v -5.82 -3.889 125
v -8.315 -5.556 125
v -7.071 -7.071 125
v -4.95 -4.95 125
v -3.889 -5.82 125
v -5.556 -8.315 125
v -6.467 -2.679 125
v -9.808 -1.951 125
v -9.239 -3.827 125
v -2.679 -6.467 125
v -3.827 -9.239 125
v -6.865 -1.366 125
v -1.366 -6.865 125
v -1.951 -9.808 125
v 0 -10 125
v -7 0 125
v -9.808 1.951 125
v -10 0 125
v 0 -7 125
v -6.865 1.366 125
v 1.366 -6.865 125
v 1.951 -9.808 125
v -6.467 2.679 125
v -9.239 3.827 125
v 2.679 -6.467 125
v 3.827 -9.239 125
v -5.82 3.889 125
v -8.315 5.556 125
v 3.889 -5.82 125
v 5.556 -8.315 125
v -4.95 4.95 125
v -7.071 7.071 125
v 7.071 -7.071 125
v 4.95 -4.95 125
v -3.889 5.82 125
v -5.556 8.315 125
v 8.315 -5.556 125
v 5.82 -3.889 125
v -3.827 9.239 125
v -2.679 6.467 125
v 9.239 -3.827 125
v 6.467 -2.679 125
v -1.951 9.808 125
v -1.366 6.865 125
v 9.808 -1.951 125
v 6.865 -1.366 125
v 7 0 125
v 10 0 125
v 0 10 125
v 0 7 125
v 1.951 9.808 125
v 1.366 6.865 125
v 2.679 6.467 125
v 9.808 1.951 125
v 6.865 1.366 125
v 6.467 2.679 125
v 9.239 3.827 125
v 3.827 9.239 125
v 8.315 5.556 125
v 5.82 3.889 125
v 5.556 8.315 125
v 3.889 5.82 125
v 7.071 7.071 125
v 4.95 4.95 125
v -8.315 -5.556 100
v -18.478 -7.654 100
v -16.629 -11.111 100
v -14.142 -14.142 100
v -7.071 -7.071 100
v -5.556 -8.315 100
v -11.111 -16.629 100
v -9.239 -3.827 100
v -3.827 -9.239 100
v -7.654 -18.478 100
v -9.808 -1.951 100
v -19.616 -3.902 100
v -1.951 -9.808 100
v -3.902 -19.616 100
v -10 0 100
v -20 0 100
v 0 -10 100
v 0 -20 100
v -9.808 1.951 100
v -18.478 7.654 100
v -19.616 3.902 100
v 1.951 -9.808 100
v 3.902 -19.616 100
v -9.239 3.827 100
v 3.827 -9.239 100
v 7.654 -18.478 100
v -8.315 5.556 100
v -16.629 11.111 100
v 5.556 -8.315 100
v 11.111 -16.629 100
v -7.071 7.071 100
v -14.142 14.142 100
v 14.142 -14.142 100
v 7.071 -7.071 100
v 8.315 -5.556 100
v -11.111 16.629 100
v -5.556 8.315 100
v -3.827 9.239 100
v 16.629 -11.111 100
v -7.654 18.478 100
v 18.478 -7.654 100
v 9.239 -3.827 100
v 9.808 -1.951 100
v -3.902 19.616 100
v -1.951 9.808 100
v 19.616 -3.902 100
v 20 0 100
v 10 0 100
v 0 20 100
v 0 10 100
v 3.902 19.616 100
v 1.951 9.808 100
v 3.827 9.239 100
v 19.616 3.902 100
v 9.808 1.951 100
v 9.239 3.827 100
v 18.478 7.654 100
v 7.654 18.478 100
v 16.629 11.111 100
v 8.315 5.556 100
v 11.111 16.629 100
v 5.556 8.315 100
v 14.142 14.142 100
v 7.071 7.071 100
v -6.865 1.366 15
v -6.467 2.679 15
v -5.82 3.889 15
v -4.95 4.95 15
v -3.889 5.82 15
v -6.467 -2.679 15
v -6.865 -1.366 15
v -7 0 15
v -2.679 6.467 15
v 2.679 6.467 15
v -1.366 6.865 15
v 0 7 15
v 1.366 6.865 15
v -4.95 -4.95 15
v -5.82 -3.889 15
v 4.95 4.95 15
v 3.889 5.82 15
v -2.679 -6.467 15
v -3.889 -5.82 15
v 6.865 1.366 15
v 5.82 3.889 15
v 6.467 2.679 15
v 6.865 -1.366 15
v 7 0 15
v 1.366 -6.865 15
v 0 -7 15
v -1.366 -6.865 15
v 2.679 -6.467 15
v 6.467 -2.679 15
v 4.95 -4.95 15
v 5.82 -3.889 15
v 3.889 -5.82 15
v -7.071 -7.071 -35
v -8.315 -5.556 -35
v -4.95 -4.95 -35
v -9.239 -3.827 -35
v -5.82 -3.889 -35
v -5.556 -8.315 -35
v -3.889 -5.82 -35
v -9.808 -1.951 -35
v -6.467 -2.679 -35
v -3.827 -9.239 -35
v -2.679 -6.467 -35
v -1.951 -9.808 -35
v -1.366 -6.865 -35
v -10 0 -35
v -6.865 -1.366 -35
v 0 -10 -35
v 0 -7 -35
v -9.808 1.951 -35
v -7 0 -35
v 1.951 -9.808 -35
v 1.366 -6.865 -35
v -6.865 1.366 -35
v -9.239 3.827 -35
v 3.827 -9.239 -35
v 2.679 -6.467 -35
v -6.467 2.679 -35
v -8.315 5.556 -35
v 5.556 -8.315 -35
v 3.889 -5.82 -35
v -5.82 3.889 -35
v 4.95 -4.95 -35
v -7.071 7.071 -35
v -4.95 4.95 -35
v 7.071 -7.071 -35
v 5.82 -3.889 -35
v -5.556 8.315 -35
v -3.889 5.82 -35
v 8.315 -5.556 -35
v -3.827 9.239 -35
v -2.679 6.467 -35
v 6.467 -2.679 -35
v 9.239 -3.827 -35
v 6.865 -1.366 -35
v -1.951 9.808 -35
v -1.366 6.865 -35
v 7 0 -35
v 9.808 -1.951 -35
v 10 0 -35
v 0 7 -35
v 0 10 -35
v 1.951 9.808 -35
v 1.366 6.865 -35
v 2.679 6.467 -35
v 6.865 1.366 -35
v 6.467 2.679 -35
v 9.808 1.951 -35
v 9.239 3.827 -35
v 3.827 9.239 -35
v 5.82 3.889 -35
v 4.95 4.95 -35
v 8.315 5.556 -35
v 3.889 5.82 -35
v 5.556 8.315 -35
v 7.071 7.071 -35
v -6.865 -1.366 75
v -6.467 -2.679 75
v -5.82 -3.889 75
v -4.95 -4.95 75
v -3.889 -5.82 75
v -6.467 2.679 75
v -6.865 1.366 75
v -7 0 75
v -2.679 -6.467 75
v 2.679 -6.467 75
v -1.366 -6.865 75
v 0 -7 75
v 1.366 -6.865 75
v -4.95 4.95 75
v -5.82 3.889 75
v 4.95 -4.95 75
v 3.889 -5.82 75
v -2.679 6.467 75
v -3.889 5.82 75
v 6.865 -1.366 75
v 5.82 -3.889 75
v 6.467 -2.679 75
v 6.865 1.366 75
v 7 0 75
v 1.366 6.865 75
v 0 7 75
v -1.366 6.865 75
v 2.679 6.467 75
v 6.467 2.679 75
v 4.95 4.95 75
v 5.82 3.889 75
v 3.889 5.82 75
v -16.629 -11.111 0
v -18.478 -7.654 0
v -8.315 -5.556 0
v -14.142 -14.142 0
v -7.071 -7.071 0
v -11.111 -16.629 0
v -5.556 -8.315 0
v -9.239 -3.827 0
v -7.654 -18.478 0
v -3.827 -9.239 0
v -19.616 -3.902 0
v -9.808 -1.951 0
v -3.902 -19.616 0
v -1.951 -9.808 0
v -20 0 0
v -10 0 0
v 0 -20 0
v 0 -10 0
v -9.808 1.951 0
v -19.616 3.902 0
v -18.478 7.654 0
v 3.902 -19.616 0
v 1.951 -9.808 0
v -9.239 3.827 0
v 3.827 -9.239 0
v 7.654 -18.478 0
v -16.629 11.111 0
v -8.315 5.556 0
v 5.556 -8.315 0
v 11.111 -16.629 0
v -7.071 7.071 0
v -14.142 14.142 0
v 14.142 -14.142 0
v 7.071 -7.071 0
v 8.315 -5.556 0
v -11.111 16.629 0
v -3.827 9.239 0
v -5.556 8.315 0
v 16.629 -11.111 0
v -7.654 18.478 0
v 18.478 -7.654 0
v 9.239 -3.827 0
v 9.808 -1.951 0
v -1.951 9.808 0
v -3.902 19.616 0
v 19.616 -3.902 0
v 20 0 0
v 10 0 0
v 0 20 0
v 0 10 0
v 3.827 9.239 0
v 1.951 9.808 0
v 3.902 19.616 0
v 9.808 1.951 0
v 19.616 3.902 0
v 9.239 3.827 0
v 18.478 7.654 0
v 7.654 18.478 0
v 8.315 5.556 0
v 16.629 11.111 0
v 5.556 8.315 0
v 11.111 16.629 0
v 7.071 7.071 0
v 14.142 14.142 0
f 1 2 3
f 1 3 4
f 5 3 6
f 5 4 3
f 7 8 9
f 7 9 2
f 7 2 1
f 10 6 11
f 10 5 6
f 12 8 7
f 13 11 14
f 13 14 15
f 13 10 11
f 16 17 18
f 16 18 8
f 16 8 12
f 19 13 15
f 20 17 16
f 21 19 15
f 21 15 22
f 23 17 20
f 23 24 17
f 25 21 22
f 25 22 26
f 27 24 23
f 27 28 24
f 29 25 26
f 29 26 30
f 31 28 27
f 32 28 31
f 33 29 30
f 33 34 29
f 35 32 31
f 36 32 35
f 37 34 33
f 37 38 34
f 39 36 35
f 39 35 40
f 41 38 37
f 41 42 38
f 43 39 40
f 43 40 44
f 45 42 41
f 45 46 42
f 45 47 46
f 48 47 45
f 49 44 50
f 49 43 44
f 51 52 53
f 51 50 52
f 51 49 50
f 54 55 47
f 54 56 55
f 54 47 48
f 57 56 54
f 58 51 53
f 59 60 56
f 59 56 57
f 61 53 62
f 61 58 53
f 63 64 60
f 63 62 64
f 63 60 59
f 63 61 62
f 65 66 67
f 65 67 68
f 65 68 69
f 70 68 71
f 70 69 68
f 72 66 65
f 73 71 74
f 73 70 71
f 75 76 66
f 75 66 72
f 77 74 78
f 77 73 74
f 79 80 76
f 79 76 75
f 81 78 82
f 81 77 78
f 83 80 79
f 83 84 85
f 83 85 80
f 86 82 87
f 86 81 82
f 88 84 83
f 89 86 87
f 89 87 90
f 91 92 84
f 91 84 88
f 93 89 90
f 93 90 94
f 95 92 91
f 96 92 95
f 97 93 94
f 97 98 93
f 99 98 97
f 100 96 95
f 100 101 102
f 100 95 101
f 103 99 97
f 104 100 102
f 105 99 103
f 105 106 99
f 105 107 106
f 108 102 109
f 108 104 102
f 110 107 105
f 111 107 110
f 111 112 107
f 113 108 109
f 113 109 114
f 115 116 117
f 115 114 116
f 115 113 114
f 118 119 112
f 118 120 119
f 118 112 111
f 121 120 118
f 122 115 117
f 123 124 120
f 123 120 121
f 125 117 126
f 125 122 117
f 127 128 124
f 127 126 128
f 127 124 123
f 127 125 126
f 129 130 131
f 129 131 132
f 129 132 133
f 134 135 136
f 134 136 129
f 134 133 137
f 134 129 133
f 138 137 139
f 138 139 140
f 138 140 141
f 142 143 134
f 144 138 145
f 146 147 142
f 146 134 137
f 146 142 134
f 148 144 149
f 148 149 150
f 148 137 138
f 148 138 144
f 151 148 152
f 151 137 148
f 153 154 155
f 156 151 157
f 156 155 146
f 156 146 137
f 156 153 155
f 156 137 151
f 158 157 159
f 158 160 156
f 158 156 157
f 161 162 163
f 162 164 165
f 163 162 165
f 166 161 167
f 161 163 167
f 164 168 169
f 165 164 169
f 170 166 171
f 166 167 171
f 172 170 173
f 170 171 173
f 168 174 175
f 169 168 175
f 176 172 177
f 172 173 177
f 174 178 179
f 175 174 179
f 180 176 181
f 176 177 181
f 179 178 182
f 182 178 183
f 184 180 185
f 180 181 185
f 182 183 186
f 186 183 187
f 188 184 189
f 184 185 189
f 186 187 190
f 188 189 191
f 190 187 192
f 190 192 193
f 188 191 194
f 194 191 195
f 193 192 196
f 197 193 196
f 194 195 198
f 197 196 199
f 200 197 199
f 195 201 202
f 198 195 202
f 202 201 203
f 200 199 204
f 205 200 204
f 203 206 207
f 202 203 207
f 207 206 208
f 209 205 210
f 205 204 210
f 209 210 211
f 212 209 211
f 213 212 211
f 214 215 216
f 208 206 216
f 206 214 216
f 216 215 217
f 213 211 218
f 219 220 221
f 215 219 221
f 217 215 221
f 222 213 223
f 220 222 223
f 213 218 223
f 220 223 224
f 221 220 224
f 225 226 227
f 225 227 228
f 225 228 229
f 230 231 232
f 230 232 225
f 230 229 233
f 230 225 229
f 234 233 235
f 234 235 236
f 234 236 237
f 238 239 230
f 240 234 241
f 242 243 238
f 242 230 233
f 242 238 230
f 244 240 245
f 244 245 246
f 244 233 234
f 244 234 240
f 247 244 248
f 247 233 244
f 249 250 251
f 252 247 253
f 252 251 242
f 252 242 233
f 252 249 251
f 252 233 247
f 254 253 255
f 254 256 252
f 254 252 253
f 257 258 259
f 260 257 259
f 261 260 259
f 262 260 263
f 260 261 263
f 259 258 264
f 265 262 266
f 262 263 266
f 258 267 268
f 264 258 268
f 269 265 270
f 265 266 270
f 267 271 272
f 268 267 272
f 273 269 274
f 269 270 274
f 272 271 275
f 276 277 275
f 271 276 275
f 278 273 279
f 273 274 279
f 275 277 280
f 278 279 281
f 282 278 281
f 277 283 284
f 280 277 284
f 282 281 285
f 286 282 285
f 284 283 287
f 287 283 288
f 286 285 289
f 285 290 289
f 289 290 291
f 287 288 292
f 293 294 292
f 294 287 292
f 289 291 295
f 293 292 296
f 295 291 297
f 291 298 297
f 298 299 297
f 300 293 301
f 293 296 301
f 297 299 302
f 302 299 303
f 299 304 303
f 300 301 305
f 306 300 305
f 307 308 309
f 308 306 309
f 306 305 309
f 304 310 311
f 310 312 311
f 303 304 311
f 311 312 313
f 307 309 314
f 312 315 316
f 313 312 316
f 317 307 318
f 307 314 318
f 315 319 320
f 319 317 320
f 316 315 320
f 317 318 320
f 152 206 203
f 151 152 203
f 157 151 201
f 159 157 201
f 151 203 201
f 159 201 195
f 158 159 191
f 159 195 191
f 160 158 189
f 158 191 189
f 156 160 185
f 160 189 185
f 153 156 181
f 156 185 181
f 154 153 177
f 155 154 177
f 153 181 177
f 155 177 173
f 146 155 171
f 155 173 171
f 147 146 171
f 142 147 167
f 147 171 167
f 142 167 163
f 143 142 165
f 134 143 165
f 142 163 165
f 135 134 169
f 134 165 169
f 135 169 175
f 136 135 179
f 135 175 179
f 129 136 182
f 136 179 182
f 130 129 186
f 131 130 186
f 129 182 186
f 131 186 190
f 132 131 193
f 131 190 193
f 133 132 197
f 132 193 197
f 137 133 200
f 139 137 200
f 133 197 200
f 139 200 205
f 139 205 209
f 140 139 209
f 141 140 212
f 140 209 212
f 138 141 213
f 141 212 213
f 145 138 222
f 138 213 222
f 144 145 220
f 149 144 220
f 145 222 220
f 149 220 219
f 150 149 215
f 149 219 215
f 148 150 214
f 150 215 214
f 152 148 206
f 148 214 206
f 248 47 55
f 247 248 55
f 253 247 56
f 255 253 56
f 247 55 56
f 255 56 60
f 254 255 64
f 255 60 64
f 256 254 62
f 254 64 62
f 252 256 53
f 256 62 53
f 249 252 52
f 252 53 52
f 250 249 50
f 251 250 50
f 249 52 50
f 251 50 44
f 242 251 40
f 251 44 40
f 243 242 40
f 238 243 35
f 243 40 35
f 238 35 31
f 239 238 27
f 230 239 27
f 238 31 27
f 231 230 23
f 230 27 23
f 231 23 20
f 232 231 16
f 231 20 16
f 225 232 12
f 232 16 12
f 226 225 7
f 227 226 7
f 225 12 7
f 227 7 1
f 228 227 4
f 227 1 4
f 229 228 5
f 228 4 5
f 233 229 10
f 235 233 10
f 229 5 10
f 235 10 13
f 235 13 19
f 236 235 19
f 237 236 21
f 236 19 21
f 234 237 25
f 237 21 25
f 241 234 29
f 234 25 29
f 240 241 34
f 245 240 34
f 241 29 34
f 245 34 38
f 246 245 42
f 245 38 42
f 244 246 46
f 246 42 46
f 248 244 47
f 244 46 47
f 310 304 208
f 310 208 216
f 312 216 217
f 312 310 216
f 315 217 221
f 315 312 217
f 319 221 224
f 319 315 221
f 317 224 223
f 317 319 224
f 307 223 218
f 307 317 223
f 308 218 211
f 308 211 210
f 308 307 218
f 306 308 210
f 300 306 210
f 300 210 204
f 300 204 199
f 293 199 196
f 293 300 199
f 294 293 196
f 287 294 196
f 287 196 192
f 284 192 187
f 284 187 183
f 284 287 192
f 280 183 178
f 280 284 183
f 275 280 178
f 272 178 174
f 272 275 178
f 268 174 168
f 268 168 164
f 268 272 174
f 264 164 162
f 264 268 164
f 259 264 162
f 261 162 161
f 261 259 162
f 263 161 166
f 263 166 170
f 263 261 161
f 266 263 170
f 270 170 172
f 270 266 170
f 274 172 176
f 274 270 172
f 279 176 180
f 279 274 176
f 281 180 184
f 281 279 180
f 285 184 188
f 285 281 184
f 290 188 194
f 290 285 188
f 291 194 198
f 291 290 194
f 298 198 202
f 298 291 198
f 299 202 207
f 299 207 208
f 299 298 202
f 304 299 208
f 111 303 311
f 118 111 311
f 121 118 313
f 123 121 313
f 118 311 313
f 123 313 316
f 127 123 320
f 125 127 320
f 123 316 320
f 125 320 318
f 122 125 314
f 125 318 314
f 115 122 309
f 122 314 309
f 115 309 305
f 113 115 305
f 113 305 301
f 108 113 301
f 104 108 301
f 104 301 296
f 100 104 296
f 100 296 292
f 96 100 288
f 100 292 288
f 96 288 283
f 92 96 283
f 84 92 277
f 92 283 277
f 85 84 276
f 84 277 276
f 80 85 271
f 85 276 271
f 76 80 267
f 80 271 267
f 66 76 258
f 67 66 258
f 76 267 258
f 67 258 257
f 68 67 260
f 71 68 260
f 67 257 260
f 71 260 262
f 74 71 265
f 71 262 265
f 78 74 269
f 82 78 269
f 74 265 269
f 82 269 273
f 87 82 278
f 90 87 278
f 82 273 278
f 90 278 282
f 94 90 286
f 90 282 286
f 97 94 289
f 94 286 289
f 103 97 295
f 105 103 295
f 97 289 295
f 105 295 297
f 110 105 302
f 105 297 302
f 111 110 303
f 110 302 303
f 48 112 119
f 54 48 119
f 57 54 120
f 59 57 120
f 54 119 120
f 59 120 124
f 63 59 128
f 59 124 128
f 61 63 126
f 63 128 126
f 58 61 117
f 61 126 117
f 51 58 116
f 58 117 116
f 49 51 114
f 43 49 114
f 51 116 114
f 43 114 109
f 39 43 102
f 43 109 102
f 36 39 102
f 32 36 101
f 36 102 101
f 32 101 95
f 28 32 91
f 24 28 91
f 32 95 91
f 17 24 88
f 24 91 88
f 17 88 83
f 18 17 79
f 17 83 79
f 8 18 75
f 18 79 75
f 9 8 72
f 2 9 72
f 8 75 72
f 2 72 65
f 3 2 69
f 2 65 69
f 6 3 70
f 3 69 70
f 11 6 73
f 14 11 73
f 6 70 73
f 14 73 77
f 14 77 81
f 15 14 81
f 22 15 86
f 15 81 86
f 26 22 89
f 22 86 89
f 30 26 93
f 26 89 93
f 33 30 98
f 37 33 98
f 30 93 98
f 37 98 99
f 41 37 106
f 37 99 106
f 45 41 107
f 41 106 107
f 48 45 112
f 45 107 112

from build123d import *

# Parameters (mm, degrees)
F0_R      = 10
F1_DEPTH  = 35
F0_R_2    = 20
F1_FACE_R = 10
F2_DEPTH  = 100
F3_R      = 10
F4_DEPTH  = 25
F5_R      = 7
F6_DEPTH  = 50
F7_R      = 7
F8_DEPTH  = 50


with BuildPart() as f1:
    # F0 (on Top) → F1 (new body)
    with BuildSketch(Plane.XY):
        Circle(F0_R)
    extrude(amount=-F1_DEPTH)

    # F0 (on Top) + F1_face (on face) → F2 (join)
    with BuildSketch(Plane.XY):
        Circle(F0_R_2)
        Circle(F0_R, mode=Mode.SUBTRACT)
    with BuildSketch(Plane.XY):
        Circle(F1_FACE_R)
    extrude(amount=F2_DEPTH)

    # F3 (on face) → F4 (join)
    with BuildSketch(Plane.XY.offset(100)):
        Circle(F3_R)
    extrude(amount=F4_DEPTH)

    # F5 (on face) → F6 (cut)
    with BuildSketch(Plane.XY.offset(125)):
        Circle(F5_R)
    extrude(amount=-F6_DEPTH, mode=Mode.SUBTRACT)

    # F7 (on face) → F8 (cut)
    with BuildSketch(Plane(origin=(0, 0, -35), x_dir=(1, 0, 0), z_dir=(0, 0, -1))):
        Circle(F7_R)
    extrude(amount=-F8_DEPTH, mode=Mode.SUBTRACT)


solid = f1.part
